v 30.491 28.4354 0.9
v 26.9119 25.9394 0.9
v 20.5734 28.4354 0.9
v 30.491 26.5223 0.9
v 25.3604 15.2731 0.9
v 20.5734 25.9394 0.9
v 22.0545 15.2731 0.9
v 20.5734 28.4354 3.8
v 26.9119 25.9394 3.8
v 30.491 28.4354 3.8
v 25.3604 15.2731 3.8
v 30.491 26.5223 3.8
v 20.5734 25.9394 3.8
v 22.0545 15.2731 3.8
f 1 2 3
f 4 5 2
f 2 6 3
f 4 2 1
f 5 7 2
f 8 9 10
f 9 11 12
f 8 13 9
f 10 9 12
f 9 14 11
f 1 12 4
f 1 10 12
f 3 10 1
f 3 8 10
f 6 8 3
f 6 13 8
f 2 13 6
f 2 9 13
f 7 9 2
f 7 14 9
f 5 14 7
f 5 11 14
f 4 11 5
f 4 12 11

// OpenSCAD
$fn = 48;
  translate([25.500, 21.700, 0.900])
    linear_extrude(height=2.900)
      text("7", size=13.000, halign="center", valign="center", font="Helvetica Neue:style=Bold");
